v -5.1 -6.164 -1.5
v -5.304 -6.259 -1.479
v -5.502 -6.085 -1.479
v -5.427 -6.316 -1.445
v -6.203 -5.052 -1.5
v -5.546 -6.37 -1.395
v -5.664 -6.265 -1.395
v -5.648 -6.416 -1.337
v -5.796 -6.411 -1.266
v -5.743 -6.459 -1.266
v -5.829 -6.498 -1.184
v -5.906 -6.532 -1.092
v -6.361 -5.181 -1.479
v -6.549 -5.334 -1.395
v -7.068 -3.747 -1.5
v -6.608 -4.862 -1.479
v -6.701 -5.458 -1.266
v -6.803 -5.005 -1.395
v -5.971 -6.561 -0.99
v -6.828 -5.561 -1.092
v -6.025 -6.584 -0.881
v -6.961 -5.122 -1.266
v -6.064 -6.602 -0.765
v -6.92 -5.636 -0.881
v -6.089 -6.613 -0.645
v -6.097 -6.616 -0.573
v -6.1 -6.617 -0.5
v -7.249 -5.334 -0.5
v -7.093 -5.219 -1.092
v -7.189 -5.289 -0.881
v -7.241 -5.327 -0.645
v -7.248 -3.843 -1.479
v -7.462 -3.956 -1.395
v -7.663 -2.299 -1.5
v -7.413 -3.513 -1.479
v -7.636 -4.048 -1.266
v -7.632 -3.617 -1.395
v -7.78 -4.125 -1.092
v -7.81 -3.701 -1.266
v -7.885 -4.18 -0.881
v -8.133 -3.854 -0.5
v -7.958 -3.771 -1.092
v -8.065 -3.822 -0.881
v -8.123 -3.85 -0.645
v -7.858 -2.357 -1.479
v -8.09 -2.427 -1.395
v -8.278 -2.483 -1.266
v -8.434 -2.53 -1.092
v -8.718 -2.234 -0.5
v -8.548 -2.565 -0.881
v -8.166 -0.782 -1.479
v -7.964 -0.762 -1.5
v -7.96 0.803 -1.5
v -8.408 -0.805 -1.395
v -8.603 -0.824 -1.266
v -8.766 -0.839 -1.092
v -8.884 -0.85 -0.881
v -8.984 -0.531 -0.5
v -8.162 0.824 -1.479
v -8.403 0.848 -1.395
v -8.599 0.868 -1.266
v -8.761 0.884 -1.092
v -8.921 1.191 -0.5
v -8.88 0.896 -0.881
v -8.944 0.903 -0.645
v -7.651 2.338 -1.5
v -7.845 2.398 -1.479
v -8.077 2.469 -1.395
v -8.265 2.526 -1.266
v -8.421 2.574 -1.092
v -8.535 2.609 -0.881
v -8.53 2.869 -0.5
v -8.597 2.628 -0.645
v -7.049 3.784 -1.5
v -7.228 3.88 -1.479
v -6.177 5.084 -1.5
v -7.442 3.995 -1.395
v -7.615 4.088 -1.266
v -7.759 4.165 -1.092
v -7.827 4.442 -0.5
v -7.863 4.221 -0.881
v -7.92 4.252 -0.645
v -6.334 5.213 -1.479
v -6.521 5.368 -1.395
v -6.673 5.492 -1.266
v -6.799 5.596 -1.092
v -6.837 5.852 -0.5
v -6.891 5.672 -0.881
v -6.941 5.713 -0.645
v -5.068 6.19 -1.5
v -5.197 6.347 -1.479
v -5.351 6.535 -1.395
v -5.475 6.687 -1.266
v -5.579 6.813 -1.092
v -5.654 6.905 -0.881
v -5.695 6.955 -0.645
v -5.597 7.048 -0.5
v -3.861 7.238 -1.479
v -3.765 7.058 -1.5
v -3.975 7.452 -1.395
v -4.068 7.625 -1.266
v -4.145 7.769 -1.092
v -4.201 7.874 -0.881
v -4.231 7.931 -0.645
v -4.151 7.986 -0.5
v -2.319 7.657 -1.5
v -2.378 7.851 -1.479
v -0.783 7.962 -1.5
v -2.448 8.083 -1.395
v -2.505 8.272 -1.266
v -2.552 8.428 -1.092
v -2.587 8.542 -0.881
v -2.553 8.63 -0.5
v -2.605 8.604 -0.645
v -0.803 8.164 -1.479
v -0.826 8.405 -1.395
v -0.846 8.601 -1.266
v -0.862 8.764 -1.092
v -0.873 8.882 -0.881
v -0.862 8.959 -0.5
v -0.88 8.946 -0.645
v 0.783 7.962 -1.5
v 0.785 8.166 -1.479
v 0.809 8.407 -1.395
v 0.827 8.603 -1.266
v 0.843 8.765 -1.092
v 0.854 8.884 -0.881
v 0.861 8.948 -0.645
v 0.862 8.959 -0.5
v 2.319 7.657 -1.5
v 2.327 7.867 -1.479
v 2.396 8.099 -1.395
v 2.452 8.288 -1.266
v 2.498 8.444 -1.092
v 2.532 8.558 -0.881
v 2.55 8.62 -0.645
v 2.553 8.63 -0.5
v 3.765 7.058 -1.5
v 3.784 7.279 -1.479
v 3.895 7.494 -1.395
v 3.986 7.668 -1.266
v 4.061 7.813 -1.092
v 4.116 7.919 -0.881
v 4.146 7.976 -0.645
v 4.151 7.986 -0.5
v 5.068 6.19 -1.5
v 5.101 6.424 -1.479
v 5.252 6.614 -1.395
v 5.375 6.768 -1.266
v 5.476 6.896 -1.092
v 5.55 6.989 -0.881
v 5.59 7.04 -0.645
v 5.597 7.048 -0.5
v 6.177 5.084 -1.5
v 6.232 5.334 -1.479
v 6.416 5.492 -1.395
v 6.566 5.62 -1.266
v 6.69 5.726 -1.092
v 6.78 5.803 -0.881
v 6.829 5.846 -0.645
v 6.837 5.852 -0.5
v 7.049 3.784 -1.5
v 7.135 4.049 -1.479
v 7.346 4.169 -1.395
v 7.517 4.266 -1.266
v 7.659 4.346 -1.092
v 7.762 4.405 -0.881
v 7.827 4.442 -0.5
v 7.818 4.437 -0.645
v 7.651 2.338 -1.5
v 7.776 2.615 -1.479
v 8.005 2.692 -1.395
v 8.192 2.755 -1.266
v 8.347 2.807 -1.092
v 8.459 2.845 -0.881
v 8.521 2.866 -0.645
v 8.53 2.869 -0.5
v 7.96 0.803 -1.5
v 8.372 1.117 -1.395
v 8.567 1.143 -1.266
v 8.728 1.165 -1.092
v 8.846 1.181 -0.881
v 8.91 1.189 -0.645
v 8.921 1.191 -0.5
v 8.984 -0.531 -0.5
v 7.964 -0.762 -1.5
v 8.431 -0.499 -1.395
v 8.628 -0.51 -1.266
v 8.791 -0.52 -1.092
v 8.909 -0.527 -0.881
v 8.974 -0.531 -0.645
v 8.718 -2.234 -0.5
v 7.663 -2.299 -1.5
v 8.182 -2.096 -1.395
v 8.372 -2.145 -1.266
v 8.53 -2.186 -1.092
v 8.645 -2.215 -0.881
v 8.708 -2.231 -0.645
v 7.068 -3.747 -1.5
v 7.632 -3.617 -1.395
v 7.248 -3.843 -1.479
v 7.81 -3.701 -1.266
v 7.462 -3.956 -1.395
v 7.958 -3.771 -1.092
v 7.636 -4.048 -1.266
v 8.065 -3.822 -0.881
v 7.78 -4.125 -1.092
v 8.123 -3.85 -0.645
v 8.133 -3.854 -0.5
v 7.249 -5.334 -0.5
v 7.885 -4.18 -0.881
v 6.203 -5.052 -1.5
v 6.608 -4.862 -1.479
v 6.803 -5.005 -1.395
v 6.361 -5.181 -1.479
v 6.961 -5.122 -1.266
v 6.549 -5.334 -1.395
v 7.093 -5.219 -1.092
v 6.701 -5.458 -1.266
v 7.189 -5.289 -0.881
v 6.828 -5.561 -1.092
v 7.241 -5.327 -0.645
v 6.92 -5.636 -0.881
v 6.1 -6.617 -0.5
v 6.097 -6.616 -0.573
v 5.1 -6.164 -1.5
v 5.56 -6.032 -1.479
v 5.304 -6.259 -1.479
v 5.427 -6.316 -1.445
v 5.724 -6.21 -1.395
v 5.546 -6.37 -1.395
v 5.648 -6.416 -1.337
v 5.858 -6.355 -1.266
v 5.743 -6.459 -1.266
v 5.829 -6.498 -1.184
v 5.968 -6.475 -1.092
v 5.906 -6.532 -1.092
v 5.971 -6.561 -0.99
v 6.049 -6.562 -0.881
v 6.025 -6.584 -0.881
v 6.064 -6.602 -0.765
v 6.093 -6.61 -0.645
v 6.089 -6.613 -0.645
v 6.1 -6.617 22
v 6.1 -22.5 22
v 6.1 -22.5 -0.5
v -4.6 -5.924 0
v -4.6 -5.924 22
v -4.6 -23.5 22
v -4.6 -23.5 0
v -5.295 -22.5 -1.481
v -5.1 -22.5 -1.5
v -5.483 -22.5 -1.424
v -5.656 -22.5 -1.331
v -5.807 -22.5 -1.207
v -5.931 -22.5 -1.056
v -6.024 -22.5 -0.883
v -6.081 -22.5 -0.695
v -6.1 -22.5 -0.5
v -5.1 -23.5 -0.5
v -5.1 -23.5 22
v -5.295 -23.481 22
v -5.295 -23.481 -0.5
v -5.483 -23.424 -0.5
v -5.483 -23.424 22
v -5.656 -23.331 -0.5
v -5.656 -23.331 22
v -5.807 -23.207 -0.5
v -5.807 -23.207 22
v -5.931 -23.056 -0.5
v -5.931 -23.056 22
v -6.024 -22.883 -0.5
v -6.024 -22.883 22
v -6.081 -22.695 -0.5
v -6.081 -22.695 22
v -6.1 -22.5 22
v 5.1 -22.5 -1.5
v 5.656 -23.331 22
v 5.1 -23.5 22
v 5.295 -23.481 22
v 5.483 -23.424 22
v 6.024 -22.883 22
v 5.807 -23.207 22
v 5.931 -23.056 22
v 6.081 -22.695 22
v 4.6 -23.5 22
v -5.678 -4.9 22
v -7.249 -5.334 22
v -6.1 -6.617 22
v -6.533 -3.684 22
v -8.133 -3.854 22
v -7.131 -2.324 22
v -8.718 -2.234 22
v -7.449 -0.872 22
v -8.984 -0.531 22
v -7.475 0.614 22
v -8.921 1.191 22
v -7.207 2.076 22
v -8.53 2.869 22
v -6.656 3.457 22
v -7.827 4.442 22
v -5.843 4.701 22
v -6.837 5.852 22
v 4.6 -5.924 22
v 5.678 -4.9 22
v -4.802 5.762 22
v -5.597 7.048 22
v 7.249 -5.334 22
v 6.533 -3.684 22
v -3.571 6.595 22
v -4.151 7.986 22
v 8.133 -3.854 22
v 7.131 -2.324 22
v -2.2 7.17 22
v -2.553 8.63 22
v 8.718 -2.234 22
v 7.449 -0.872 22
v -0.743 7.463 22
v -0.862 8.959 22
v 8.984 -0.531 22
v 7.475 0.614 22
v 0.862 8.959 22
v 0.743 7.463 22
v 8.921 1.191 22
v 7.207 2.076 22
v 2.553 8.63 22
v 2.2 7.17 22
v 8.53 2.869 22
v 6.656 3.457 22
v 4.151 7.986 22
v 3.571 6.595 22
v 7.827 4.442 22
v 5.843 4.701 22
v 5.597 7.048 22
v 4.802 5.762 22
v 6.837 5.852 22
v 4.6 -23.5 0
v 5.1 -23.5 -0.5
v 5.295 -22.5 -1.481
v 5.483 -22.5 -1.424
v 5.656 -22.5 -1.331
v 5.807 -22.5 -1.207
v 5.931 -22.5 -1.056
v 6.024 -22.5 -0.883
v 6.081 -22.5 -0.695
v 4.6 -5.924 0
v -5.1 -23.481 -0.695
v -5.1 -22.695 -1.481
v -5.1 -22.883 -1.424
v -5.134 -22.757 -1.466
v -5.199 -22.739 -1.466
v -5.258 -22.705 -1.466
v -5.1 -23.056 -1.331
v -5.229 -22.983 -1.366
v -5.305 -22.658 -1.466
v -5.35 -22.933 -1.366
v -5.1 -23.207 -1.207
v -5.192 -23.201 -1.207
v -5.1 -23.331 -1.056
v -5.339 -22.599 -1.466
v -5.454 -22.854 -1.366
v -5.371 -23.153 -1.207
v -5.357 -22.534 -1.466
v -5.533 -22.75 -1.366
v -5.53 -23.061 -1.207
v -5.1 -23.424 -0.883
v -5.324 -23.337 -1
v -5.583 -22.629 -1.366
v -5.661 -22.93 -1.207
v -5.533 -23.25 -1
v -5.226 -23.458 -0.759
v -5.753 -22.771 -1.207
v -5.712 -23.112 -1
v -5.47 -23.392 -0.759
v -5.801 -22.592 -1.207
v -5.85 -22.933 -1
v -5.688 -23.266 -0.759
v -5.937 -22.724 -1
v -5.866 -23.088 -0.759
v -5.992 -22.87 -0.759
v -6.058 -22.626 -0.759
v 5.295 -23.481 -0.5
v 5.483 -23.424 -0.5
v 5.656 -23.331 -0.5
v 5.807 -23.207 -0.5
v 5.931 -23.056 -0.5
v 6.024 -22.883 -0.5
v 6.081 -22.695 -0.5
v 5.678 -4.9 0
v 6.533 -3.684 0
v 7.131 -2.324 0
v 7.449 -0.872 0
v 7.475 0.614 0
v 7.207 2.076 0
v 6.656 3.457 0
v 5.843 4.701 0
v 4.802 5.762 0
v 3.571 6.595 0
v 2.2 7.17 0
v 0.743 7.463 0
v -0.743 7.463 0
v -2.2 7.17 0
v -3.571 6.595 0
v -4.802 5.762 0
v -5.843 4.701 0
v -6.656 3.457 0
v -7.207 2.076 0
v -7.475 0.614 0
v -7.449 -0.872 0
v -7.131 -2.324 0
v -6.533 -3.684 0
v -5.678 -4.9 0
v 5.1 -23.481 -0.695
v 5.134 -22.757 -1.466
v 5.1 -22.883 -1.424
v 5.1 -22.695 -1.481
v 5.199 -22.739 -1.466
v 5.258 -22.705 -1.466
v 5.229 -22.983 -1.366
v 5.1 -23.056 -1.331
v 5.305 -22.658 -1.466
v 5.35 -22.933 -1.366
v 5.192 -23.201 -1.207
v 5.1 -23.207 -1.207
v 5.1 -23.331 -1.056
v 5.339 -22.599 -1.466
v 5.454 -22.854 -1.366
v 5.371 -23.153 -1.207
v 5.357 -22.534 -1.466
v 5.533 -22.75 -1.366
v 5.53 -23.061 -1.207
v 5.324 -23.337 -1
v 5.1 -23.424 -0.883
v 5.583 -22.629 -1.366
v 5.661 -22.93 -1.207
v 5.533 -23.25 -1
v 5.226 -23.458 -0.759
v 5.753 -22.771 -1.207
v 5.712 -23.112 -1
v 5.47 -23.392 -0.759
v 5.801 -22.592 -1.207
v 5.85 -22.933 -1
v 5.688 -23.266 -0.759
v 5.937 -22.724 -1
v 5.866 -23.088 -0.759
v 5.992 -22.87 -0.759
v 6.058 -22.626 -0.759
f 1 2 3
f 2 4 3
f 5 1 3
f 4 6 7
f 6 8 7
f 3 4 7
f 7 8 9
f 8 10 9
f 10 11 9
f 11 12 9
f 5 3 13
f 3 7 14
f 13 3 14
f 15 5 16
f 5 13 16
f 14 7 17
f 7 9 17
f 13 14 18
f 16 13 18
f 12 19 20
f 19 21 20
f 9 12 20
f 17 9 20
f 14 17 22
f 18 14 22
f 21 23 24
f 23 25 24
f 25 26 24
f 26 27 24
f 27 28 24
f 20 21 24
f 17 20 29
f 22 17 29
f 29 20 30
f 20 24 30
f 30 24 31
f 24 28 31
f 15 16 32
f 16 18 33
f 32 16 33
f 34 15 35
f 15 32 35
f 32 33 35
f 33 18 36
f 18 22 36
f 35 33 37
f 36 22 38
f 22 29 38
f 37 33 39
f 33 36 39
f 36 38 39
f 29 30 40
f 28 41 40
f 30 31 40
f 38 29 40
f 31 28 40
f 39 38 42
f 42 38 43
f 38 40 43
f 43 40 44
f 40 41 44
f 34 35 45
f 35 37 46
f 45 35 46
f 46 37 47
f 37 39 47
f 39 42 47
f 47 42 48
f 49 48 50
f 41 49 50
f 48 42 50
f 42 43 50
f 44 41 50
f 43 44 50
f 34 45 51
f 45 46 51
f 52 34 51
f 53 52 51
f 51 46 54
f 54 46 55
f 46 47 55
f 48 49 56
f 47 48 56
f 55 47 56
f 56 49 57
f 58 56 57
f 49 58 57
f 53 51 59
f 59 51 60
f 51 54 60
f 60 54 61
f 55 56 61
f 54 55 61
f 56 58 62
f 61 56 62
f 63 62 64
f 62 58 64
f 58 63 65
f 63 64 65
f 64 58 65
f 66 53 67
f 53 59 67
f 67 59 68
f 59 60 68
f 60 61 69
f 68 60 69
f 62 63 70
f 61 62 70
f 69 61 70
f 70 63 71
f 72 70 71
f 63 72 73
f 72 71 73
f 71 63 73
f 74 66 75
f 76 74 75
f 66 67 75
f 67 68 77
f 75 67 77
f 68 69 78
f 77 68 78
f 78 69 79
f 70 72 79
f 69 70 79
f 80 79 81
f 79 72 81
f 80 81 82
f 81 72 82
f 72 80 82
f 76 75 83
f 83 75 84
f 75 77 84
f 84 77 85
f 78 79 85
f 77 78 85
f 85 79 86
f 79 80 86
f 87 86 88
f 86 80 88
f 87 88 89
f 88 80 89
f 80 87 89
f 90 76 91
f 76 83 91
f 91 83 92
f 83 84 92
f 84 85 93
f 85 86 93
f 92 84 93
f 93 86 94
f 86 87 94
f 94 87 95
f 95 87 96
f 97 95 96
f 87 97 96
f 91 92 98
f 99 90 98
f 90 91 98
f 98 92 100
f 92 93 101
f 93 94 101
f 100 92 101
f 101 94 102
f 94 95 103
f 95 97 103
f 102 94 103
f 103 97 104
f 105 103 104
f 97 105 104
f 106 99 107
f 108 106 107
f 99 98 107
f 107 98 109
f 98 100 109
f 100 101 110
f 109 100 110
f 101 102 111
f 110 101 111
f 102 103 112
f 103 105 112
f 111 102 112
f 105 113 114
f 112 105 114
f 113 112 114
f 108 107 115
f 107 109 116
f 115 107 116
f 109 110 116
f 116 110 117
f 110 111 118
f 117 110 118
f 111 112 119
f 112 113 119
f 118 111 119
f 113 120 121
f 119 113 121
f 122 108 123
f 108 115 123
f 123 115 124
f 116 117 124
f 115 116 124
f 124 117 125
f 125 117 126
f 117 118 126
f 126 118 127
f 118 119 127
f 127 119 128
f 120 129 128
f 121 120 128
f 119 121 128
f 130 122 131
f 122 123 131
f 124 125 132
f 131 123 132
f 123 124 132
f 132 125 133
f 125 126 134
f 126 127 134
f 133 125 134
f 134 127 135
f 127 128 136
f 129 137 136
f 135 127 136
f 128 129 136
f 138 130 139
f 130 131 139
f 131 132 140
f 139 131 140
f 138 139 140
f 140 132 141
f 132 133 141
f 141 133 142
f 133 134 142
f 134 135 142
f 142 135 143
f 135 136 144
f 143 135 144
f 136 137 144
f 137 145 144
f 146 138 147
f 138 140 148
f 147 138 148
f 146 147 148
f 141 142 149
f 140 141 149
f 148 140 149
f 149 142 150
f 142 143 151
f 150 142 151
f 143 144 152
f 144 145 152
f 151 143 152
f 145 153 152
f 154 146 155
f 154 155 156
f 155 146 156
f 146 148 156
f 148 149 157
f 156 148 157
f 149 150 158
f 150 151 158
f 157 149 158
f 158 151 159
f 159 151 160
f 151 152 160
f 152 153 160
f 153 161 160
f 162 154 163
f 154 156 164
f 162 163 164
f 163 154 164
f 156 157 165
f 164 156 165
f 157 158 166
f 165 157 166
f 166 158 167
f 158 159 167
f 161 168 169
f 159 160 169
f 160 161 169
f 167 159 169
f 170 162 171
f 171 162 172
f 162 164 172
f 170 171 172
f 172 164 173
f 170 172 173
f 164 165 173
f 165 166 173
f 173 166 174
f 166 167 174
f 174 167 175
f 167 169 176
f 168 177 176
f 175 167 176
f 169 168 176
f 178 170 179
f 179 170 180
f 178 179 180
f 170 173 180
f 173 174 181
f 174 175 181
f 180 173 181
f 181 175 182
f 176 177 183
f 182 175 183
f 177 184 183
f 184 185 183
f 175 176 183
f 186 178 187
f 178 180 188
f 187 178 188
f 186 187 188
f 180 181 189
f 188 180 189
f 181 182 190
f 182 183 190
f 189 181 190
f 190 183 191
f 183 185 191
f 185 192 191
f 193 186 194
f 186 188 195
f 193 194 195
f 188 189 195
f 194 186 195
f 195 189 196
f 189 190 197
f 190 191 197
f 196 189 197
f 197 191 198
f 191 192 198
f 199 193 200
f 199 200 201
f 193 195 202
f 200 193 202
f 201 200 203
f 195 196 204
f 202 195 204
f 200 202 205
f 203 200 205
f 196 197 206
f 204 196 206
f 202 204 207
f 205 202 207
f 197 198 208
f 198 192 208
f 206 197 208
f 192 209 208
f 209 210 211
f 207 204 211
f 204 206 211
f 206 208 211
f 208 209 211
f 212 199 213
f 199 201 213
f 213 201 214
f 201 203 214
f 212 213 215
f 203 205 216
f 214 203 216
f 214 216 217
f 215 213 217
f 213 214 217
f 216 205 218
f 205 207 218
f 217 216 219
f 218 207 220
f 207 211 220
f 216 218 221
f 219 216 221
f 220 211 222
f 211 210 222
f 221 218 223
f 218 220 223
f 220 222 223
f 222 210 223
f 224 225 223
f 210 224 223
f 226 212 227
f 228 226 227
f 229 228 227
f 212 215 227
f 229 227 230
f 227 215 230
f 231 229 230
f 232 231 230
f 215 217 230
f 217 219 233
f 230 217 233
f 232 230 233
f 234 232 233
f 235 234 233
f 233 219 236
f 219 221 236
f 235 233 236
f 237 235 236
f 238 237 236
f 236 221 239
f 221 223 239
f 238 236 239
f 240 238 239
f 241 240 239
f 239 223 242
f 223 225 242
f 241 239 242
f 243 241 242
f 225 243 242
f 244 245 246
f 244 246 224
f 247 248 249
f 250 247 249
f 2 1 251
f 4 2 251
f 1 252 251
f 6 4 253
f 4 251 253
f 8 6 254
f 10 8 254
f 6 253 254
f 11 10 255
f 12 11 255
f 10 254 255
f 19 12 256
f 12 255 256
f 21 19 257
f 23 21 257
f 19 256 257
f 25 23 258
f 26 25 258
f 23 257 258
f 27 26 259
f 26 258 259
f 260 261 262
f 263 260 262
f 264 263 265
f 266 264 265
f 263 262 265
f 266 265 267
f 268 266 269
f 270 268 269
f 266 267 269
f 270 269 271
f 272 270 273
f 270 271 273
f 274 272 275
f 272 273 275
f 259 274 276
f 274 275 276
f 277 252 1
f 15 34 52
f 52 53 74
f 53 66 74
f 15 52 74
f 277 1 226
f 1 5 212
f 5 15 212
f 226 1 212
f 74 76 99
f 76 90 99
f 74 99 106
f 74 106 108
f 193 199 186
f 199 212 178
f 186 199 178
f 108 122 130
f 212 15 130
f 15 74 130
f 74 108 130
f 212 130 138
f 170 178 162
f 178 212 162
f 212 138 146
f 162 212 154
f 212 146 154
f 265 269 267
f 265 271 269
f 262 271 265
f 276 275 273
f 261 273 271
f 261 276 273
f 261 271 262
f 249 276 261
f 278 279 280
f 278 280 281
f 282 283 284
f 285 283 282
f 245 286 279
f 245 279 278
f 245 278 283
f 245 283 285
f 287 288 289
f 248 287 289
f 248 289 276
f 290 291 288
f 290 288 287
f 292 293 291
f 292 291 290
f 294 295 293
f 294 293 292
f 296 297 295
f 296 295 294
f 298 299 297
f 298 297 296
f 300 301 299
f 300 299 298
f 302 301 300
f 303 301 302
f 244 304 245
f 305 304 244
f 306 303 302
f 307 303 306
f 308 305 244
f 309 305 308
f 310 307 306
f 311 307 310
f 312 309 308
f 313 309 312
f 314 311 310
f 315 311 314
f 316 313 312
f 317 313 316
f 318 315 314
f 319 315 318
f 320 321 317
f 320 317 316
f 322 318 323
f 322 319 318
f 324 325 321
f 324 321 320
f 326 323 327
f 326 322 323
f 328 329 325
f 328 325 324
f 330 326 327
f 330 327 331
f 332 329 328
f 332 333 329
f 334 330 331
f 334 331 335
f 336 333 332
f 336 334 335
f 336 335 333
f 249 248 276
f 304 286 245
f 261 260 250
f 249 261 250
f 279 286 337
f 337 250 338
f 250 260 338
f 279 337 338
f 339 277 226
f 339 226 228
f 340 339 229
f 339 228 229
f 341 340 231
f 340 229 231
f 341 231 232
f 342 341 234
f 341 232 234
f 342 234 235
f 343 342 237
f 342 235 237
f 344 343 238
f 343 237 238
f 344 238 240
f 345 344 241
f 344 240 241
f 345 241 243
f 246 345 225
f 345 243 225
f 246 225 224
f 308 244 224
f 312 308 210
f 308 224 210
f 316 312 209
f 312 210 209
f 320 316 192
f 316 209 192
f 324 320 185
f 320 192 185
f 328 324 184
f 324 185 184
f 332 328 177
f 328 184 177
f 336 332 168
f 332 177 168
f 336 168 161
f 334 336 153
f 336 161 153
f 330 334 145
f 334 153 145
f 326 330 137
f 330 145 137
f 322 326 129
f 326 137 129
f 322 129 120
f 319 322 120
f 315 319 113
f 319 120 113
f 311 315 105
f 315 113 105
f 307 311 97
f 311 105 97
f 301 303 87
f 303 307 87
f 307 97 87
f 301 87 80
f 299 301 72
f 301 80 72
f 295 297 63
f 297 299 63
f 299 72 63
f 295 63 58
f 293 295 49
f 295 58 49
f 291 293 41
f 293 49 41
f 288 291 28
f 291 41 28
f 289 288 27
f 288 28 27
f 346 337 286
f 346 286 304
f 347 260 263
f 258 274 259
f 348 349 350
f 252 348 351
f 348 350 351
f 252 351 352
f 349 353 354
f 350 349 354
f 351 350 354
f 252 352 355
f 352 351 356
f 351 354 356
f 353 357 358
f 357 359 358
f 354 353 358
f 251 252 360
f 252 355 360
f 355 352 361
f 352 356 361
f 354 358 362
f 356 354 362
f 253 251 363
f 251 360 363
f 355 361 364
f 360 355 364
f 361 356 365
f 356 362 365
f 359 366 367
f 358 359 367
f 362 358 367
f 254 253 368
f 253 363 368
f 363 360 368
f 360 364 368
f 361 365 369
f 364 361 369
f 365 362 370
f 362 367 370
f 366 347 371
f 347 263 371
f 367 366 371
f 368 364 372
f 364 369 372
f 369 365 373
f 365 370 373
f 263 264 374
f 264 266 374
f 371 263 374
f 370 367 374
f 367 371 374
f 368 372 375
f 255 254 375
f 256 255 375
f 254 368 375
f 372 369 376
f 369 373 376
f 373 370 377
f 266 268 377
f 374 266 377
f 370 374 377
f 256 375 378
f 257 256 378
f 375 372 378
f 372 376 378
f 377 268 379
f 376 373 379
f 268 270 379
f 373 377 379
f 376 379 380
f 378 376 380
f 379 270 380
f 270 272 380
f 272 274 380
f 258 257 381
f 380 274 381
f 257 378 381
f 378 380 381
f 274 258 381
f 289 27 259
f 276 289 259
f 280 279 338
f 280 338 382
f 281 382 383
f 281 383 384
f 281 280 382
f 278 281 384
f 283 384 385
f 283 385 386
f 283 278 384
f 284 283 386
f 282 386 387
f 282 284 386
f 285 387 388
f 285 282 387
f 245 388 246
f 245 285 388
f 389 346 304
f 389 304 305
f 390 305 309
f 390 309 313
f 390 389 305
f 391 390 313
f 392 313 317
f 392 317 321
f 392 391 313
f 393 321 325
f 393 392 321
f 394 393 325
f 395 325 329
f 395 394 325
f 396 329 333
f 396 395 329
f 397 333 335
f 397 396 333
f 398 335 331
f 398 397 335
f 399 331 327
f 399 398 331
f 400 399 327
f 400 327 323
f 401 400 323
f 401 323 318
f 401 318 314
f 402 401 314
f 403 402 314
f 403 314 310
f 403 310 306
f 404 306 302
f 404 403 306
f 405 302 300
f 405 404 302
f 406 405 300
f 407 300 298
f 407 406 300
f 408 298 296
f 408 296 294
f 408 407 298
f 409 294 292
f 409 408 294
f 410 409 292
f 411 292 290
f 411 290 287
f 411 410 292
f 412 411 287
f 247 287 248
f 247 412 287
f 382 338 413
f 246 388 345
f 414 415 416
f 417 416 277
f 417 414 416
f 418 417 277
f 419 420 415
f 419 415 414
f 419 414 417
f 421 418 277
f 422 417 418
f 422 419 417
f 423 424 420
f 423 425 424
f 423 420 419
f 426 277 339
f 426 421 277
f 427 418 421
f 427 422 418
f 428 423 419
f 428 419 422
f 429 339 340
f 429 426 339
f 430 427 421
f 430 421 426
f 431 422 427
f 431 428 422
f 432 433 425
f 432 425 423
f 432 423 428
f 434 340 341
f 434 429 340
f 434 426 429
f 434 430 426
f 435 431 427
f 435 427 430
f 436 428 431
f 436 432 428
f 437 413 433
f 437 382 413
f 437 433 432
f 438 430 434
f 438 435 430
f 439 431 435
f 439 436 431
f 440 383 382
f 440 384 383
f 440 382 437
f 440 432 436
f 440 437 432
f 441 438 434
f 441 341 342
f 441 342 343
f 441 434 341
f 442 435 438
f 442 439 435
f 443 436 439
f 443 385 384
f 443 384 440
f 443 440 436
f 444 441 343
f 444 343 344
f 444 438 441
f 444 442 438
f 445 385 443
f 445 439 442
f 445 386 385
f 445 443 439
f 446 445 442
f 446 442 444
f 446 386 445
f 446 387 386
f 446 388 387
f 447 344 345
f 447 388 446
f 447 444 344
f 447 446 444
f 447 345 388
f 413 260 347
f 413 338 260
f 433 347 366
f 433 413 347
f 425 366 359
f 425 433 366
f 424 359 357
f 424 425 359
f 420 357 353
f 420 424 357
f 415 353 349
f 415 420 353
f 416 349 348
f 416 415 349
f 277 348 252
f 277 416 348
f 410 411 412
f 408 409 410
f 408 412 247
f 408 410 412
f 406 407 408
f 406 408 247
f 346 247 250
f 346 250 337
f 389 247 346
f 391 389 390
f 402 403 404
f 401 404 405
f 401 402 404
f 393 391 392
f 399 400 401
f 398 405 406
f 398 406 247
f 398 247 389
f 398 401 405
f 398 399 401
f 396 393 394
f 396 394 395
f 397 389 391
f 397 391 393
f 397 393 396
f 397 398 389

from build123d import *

# Parameters (mm, degrees)
F1_DEPTH = 22
F2_T     = 1.5
F3_W     = 9.2
F3_H     = 22
F4_DEPTH = 1.5
F5_R     = 1


with BuildPart() as f1:
    # F0 (on Top) → F1 (new body)
    with BuildSketch(Plane.XY):
        with BuildLine():
            Line((-4.6, -5.9236812878), (-4.6, -22))
            Line((-4.6, -22), (4.6, -22))
            Line((4.6, -22), (4.6, -5.9236812878))
            ThreePointArc((4.6, -5.9236812878), (0, 7.5), (-4.6, -5.9236812878))
        make_face()
    extrude(amount=F1_DEPTH)

    # F2
    f2_openings = [f1.faces().sort_by_distance(p)[0] for p in [
        (0, -6.355052, 22),
    ]]
    offset(amount=F2_T, openings=f2_openings, kind=Kind.INTERSECTION)

    # F3 (on face) → F4 (cut, through all)
    with BuildSketch(Plane.XZ.offset(23.5)):
        with Locations((0, 11)):
            Rectangle(F3_W, F3_H)
    extrude(amount=-F4_DEPTH, mode=Mode.SUBTRACT)

    # F5
    f5_edges = [f1.edges().sort_by_distance(p)[0] for p in [
        (6.1, -23.5, 10.25),
        (-6.1, -23.5, 10.25),
        (0, -23.5, -1.5),
        (-6.1, -15.058701, -1.5),
        (6.1, -15.058701, -1.5),
        (0, 9, -1.5),
    ]]
    fillet(f5_edges, radius=F5_R)


solid = f1.part
